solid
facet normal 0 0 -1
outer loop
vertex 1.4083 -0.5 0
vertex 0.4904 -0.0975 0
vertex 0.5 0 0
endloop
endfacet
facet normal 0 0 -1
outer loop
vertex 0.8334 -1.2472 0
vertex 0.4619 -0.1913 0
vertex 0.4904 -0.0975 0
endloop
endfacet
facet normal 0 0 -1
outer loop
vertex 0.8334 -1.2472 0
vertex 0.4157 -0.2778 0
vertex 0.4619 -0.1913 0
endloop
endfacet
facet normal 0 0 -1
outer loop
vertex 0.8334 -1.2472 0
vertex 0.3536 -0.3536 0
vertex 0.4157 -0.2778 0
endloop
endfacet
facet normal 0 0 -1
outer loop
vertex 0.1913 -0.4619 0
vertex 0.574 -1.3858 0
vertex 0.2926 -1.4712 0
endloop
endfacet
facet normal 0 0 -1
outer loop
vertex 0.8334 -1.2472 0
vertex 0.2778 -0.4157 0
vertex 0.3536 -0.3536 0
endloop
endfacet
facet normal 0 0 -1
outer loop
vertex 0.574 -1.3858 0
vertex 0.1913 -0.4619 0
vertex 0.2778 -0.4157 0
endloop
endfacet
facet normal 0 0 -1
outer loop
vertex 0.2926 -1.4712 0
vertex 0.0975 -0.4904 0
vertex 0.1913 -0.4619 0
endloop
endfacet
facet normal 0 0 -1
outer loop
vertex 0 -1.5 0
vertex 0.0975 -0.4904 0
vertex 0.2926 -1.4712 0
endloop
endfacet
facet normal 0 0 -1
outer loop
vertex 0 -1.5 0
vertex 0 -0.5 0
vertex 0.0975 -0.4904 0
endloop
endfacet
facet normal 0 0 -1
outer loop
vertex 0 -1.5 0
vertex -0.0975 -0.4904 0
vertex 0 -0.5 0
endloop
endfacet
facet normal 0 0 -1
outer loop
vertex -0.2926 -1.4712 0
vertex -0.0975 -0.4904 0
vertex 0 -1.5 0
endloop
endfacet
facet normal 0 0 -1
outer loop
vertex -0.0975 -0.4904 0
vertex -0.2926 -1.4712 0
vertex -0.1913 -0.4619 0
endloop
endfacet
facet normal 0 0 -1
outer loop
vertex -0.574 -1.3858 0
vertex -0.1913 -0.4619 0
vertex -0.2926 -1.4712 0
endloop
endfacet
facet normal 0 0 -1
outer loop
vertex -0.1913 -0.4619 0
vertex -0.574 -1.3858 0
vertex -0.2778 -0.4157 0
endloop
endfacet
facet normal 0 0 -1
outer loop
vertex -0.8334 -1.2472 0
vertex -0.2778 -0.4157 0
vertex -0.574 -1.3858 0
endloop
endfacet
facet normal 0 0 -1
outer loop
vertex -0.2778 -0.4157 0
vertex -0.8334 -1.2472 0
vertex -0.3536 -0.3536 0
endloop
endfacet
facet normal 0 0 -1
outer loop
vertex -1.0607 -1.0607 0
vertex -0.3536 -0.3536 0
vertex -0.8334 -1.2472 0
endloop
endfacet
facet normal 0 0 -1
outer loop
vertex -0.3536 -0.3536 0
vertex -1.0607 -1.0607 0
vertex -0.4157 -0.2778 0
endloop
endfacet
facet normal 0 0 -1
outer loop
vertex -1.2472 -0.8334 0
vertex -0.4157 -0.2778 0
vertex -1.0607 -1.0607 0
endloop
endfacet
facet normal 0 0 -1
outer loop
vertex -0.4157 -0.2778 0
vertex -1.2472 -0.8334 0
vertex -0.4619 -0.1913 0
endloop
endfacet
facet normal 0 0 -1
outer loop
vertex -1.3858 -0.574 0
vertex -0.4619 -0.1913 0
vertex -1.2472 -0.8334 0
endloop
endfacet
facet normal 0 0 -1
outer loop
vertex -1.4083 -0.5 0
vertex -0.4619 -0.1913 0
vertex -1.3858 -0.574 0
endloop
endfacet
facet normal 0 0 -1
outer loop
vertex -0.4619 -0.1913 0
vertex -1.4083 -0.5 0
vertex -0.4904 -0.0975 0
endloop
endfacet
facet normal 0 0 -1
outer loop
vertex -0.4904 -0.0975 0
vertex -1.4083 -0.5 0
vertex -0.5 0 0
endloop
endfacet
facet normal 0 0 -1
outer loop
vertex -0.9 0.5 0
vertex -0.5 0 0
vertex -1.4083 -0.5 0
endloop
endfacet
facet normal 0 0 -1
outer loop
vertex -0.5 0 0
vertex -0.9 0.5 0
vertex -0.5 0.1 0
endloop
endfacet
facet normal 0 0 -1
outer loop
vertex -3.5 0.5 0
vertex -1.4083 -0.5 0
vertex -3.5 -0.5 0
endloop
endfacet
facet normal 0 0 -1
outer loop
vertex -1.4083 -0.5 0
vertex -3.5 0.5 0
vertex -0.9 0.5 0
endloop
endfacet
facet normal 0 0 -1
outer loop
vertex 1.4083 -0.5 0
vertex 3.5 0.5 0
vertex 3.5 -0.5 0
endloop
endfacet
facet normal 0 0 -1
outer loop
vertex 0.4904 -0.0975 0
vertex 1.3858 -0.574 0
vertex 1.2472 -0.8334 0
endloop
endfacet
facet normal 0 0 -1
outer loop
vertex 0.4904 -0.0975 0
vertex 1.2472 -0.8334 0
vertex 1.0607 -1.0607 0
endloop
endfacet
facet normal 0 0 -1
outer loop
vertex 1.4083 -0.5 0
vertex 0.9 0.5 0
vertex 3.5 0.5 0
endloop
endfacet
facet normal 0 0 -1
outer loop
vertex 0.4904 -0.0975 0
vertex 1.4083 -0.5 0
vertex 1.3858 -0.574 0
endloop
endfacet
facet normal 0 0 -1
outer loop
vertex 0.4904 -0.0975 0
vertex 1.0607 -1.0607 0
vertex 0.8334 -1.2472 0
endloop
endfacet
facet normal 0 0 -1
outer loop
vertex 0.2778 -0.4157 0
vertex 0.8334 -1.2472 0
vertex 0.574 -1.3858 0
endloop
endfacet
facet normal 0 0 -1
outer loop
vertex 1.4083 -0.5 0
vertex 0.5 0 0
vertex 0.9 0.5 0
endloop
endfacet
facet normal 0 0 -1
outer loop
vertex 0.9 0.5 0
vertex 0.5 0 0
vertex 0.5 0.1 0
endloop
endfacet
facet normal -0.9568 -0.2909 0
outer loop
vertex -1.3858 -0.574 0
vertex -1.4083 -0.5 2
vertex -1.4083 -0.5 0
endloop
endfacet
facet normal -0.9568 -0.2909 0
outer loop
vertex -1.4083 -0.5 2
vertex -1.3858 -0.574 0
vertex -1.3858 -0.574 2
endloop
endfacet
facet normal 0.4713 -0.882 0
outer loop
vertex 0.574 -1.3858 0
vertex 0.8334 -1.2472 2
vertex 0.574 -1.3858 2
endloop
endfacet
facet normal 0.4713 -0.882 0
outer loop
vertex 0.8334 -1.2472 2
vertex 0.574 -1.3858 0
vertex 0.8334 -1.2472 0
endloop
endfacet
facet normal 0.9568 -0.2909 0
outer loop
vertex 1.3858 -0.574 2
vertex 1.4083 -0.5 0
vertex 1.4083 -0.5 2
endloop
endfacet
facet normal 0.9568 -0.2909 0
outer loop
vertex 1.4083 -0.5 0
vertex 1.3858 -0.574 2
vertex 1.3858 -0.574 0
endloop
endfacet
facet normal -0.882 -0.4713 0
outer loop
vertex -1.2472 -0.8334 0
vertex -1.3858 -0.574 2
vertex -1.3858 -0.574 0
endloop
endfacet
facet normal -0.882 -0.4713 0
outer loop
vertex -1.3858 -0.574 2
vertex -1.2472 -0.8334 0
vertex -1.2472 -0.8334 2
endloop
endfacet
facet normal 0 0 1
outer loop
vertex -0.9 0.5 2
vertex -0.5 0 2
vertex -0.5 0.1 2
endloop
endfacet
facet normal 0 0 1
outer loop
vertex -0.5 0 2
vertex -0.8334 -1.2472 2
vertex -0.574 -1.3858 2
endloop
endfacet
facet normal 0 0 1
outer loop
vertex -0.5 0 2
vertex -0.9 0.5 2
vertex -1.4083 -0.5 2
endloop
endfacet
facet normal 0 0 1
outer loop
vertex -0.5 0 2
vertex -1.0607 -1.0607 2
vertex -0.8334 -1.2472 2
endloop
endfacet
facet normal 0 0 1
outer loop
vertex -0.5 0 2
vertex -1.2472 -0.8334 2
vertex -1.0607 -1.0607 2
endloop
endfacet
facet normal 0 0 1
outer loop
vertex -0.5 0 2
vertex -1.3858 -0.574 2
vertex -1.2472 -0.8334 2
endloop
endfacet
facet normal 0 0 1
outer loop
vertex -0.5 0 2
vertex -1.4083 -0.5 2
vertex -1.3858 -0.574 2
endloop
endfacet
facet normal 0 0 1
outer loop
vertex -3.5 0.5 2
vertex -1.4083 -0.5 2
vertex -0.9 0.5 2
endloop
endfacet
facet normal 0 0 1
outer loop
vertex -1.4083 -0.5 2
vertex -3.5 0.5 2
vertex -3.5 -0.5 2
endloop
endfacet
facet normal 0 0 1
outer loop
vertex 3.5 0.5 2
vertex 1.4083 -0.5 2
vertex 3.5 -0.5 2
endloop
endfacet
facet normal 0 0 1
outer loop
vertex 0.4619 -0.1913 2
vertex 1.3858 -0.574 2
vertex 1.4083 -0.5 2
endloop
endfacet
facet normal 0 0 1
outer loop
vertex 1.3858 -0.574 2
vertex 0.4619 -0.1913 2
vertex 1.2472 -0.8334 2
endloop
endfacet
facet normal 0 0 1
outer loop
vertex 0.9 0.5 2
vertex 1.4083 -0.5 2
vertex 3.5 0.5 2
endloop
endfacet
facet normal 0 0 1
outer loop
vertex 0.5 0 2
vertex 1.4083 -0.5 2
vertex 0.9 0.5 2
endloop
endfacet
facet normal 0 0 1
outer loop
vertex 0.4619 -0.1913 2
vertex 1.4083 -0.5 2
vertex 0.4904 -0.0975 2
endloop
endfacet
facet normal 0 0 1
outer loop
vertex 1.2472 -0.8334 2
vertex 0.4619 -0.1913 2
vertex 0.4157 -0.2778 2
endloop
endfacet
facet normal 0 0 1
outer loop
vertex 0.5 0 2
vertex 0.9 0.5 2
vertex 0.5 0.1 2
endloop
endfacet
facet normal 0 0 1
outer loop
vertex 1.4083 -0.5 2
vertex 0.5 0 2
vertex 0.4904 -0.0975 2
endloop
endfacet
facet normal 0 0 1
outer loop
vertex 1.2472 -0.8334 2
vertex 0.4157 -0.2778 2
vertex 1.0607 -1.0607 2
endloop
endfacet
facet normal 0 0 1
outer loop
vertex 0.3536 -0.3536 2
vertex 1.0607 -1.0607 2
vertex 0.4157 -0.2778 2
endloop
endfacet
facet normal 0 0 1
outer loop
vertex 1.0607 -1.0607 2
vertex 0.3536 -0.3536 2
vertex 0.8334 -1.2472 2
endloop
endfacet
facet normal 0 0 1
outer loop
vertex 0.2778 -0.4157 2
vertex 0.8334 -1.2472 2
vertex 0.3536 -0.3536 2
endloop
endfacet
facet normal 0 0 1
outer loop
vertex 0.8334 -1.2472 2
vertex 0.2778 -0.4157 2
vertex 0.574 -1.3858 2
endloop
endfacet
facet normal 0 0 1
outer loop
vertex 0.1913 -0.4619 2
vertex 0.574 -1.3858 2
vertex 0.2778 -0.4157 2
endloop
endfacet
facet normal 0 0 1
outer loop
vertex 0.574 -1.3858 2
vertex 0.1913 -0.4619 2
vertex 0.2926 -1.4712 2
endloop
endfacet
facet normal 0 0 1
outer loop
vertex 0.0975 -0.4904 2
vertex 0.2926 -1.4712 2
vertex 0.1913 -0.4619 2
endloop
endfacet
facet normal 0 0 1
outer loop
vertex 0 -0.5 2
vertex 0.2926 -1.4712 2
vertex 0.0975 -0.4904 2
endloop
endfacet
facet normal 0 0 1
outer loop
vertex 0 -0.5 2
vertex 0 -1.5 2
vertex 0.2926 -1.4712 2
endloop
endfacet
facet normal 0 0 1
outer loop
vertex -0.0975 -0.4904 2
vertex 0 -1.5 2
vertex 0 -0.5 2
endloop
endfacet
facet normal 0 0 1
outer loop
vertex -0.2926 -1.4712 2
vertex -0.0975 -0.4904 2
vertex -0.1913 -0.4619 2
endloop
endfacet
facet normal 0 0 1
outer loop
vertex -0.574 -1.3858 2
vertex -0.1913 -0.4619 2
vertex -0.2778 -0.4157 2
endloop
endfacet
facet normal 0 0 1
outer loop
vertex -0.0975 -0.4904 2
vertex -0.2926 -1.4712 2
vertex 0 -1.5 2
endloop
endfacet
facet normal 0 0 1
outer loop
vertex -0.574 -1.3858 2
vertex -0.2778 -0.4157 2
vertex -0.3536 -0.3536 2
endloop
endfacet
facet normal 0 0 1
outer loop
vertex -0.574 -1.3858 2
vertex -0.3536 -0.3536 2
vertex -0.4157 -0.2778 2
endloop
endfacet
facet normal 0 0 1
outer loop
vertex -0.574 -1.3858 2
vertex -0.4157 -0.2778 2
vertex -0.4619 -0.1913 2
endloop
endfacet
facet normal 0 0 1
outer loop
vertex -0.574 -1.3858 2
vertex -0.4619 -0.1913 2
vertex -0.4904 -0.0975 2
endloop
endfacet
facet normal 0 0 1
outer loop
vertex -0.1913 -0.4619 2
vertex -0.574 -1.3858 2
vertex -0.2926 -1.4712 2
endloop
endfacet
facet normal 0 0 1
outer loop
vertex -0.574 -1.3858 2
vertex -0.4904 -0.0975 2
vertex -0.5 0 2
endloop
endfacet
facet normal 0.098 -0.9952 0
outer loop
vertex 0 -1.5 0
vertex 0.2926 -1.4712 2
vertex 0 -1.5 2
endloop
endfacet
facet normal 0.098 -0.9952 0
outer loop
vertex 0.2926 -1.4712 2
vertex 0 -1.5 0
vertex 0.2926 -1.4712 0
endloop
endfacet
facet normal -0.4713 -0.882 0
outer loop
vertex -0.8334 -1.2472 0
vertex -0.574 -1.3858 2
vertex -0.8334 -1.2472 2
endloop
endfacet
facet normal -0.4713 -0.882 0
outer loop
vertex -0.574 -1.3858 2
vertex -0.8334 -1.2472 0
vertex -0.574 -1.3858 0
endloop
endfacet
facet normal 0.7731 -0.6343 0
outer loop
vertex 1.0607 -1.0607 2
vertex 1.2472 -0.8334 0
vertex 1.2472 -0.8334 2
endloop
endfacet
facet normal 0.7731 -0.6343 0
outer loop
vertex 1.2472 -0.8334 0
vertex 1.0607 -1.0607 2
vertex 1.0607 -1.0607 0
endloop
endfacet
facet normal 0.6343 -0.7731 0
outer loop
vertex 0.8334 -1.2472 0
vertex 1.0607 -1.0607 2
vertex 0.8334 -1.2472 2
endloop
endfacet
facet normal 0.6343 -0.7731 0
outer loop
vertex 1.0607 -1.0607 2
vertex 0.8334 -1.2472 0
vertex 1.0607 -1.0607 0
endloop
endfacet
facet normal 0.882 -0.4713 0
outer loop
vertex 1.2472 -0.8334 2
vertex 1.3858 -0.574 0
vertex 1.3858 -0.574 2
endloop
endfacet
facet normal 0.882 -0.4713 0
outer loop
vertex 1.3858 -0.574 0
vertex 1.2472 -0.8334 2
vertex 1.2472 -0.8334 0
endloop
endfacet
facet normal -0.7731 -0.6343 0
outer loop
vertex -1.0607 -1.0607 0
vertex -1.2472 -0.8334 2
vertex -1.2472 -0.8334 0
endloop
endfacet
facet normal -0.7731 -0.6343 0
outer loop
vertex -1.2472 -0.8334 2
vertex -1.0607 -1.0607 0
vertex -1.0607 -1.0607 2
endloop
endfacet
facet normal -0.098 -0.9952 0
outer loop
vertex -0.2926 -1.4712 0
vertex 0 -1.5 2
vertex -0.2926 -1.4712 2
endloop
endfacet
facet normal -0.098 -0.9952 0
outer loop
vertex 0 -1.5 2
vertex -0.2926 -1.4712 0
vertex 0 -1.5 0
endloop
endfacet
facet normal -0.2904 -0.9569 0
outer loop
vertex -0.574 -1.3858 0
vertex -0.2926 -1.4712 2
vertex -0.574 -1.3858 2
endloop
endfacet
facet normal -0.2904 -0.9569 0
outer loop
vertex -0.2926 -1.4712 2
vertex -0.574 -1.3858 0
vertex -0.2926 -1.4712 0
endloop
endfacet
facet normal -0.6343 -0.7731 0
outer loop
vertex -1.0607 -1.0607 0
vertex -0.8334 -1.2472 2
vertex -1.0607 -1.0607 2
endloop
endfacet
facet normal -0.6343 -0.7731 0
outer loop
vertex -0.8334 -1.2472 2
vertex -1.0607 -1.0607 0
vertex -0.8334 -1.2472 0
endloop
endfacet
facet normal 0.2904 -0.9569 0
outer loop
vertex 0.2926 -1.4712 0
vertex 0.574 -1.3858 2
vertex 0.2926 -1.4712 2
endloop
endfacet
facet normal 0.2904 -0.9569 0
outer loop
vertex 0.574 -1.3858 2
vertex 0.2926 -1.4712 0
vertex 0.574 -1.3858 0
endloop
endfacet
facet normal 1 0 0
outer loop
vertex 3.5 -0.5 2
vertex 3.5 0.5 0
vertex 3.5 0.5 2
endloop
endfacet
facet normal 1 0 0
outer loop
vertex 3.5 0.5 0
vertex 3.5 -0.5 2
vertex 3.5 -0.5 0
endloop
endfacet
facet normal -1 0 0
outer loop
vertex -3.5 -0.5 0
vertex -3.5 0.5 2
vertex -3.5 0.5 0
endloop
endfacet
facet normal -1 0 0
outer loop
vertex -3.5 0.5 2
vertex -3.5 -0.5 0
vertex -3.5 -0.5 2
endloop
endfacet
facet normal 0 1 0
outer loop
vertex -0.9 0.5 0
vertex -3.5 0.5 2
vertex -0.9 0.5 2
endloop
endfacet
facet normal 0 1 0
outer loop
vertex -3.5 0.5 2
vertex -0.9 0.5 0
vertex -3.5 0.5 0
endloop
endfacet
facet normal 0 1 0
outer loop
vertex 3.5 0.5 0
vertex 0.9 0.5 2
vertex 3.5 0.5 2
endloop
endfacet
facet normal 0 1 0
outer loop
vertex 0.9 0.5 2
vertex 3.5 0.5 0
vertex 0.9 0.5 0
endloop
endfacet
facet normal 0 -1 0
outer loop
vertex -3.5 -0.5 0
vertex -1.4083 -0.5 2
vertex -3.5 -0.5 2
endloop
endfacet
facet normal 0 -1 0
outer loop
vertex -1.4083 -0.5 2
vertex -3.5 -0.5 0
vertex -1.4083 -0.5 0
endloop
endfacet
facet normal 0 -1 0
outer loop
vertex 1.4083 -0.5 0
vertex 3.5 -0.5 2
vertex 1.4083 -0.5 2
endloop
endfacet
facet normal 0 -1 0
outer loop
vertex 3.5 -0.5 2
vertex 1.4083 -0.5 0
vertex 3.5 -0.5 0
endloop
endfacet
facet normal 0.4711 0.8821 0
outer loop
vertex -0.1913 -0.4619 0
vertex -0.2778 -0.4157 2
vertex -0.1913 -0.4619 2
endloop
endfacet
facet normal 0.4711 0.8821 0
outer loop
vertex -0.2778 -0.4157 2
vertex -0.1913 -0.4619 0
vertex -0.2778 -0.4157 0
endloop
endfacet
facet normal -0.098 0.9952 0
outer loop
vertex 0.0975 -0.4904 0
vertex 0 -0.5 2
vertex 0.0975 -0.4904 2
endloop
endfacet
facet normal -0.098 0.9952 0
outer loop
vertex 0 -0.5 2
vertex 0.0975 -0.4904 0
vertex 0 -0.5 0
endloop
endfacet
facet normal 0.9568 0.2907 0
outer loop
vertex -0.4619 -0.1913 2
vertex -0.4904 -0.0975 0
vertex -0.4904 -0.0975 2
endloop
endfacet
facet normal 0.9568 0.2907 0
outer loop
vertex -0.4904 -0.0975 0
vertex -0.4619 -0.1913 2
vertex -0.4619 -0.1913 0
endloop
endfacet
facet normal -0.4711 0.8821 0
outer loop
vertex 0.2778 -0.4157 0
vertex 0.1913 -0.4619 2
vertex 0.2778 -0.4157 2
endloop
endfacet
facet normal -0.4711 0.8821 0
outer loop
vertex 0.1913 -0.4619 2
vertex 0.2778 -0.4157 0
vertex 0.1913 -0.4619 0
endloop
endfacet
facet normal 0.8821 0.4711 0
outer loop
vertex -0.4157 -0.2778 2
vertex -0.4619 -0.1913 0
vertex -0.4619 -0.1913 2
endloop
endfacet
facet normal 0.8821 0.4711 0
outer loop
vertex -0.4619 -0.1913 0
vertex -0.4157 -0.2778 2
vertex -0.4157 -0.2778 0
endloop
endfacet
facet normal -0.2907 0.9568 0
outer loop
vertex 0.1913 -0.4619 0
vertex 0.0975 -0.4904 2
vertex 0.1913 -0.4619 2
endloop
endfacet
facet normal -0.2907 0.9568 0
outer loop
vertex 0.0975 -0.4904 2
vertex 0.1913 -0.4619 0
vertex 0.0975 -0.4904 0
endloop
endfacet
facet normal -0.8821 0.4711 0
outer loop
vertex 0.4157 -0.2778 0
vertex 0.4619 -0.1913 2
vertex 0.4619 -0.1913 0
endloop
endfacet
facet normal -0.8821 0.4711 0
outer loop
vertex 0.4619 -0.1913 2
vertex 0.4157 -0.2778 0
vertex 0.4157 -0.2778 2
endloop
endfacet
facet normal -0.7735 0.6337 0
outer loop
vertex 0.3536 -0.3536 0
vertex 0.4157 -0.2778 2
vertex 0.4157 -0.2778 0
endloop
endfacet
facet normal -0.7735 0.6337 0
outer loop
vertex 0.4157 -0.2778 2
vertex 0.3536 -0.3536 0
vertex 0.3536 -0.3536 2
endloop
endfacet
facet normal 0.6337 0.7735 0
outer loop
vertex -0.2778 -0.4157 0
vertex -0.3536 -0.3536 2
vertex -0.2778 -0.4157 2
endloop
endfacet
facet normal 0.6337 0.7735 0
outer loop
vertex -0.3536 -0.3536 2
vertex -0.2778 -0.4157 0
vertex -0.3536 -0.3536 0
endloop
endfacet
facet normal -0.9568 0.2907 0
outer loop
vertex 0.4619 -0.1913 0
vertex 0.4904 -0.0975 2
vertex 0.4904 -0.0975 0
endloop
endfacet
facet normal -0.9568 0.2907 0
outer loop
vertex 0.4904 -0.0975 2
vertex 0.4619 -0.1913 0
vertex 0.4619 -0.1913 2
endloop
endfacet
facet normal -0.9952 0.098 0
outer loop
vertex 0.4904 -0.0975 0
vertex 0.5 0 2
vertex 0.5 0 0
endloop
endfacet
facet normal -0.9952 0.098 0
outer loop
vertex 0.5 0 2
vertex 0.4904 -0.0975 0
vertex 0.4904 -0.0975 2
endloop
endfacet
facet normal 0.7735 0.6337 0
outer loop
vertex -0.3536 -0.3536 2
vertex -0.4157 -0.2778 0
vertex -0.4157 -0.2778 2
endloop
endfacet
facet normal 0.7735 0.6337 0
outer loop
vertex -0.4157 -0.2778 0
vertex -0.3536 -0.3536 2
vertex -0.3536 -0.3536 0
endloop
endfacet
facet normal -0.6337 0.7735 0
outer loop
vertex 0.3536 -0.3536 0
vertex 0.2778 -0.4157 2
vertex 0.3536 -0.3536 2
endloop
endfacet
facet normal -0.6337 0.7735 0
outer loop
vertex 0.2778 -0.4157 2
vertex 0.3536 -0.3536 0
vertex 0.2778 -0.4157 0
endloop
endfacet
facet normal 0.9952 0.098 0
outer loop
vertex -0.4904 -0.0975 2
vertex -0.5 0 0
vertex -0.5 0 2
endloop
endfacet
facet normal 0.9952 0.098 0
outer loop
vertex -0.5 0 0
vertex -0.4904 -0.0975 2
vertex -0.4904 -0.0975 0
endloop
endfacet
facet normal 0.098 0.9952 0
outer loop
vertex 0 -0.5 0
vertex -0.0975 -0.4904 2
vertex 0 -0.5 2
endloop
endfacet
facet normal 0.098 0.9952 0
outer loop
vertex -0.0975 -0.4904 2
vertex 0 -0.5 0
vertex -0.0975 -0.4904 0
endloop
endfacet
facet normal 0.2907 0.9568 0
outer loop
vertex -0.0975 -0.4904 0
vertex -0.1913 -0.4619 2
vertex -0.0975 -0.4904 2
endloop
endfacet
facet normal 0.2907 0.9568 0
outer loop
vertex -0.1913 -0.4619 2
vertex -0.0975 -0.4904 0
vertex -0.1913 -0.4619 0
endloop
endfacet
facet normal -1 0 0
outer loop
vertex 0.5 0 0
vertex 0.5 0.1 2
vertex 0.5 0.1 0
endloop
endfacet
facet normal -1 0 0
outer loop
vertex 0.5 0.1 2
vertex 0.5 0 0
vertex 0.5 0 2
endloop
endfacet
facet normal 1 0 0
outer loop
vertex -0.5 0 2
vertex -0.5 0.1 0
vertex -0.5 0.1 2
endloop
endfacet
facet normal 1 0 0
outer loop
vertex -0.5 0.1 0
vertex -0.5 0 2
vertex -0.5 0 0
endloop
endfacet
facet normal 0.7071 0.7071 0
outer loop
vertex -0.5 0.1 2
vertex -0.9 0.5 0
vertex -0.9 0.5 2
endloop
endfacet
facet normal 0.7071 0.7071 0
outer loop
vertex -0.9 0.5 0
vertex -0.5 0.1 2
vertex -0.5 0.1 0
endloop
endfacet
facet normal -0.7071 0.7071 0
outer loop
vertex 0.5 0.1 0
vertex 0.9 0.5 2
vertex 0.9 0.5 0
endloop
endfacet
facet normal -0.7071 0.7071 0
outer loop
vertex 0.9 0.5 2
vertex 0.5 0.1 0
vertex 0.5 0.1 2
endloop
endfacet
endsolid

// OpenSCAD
$fn=32;


difference() {
  union() {
    difference() {
      cylinder(r=1.5, h=2);
      translate([-2.5,0,-0.05]) cube([5,5,3.1]);  
    }  
    translate([-3.5,-0.5,0]) cube([7,1,2]);
  }
  translate([0,0,-0.05]) {
    cylinder(r=0.5, h=3.1);
    translate([-0.5,0,0]) cube([1,4,3.1]);
  } 
  translate([0,-0.4,0]) rotate([0,0,45]) translate([0,0,-0.05]) cube([2,2,2.1]);
}
